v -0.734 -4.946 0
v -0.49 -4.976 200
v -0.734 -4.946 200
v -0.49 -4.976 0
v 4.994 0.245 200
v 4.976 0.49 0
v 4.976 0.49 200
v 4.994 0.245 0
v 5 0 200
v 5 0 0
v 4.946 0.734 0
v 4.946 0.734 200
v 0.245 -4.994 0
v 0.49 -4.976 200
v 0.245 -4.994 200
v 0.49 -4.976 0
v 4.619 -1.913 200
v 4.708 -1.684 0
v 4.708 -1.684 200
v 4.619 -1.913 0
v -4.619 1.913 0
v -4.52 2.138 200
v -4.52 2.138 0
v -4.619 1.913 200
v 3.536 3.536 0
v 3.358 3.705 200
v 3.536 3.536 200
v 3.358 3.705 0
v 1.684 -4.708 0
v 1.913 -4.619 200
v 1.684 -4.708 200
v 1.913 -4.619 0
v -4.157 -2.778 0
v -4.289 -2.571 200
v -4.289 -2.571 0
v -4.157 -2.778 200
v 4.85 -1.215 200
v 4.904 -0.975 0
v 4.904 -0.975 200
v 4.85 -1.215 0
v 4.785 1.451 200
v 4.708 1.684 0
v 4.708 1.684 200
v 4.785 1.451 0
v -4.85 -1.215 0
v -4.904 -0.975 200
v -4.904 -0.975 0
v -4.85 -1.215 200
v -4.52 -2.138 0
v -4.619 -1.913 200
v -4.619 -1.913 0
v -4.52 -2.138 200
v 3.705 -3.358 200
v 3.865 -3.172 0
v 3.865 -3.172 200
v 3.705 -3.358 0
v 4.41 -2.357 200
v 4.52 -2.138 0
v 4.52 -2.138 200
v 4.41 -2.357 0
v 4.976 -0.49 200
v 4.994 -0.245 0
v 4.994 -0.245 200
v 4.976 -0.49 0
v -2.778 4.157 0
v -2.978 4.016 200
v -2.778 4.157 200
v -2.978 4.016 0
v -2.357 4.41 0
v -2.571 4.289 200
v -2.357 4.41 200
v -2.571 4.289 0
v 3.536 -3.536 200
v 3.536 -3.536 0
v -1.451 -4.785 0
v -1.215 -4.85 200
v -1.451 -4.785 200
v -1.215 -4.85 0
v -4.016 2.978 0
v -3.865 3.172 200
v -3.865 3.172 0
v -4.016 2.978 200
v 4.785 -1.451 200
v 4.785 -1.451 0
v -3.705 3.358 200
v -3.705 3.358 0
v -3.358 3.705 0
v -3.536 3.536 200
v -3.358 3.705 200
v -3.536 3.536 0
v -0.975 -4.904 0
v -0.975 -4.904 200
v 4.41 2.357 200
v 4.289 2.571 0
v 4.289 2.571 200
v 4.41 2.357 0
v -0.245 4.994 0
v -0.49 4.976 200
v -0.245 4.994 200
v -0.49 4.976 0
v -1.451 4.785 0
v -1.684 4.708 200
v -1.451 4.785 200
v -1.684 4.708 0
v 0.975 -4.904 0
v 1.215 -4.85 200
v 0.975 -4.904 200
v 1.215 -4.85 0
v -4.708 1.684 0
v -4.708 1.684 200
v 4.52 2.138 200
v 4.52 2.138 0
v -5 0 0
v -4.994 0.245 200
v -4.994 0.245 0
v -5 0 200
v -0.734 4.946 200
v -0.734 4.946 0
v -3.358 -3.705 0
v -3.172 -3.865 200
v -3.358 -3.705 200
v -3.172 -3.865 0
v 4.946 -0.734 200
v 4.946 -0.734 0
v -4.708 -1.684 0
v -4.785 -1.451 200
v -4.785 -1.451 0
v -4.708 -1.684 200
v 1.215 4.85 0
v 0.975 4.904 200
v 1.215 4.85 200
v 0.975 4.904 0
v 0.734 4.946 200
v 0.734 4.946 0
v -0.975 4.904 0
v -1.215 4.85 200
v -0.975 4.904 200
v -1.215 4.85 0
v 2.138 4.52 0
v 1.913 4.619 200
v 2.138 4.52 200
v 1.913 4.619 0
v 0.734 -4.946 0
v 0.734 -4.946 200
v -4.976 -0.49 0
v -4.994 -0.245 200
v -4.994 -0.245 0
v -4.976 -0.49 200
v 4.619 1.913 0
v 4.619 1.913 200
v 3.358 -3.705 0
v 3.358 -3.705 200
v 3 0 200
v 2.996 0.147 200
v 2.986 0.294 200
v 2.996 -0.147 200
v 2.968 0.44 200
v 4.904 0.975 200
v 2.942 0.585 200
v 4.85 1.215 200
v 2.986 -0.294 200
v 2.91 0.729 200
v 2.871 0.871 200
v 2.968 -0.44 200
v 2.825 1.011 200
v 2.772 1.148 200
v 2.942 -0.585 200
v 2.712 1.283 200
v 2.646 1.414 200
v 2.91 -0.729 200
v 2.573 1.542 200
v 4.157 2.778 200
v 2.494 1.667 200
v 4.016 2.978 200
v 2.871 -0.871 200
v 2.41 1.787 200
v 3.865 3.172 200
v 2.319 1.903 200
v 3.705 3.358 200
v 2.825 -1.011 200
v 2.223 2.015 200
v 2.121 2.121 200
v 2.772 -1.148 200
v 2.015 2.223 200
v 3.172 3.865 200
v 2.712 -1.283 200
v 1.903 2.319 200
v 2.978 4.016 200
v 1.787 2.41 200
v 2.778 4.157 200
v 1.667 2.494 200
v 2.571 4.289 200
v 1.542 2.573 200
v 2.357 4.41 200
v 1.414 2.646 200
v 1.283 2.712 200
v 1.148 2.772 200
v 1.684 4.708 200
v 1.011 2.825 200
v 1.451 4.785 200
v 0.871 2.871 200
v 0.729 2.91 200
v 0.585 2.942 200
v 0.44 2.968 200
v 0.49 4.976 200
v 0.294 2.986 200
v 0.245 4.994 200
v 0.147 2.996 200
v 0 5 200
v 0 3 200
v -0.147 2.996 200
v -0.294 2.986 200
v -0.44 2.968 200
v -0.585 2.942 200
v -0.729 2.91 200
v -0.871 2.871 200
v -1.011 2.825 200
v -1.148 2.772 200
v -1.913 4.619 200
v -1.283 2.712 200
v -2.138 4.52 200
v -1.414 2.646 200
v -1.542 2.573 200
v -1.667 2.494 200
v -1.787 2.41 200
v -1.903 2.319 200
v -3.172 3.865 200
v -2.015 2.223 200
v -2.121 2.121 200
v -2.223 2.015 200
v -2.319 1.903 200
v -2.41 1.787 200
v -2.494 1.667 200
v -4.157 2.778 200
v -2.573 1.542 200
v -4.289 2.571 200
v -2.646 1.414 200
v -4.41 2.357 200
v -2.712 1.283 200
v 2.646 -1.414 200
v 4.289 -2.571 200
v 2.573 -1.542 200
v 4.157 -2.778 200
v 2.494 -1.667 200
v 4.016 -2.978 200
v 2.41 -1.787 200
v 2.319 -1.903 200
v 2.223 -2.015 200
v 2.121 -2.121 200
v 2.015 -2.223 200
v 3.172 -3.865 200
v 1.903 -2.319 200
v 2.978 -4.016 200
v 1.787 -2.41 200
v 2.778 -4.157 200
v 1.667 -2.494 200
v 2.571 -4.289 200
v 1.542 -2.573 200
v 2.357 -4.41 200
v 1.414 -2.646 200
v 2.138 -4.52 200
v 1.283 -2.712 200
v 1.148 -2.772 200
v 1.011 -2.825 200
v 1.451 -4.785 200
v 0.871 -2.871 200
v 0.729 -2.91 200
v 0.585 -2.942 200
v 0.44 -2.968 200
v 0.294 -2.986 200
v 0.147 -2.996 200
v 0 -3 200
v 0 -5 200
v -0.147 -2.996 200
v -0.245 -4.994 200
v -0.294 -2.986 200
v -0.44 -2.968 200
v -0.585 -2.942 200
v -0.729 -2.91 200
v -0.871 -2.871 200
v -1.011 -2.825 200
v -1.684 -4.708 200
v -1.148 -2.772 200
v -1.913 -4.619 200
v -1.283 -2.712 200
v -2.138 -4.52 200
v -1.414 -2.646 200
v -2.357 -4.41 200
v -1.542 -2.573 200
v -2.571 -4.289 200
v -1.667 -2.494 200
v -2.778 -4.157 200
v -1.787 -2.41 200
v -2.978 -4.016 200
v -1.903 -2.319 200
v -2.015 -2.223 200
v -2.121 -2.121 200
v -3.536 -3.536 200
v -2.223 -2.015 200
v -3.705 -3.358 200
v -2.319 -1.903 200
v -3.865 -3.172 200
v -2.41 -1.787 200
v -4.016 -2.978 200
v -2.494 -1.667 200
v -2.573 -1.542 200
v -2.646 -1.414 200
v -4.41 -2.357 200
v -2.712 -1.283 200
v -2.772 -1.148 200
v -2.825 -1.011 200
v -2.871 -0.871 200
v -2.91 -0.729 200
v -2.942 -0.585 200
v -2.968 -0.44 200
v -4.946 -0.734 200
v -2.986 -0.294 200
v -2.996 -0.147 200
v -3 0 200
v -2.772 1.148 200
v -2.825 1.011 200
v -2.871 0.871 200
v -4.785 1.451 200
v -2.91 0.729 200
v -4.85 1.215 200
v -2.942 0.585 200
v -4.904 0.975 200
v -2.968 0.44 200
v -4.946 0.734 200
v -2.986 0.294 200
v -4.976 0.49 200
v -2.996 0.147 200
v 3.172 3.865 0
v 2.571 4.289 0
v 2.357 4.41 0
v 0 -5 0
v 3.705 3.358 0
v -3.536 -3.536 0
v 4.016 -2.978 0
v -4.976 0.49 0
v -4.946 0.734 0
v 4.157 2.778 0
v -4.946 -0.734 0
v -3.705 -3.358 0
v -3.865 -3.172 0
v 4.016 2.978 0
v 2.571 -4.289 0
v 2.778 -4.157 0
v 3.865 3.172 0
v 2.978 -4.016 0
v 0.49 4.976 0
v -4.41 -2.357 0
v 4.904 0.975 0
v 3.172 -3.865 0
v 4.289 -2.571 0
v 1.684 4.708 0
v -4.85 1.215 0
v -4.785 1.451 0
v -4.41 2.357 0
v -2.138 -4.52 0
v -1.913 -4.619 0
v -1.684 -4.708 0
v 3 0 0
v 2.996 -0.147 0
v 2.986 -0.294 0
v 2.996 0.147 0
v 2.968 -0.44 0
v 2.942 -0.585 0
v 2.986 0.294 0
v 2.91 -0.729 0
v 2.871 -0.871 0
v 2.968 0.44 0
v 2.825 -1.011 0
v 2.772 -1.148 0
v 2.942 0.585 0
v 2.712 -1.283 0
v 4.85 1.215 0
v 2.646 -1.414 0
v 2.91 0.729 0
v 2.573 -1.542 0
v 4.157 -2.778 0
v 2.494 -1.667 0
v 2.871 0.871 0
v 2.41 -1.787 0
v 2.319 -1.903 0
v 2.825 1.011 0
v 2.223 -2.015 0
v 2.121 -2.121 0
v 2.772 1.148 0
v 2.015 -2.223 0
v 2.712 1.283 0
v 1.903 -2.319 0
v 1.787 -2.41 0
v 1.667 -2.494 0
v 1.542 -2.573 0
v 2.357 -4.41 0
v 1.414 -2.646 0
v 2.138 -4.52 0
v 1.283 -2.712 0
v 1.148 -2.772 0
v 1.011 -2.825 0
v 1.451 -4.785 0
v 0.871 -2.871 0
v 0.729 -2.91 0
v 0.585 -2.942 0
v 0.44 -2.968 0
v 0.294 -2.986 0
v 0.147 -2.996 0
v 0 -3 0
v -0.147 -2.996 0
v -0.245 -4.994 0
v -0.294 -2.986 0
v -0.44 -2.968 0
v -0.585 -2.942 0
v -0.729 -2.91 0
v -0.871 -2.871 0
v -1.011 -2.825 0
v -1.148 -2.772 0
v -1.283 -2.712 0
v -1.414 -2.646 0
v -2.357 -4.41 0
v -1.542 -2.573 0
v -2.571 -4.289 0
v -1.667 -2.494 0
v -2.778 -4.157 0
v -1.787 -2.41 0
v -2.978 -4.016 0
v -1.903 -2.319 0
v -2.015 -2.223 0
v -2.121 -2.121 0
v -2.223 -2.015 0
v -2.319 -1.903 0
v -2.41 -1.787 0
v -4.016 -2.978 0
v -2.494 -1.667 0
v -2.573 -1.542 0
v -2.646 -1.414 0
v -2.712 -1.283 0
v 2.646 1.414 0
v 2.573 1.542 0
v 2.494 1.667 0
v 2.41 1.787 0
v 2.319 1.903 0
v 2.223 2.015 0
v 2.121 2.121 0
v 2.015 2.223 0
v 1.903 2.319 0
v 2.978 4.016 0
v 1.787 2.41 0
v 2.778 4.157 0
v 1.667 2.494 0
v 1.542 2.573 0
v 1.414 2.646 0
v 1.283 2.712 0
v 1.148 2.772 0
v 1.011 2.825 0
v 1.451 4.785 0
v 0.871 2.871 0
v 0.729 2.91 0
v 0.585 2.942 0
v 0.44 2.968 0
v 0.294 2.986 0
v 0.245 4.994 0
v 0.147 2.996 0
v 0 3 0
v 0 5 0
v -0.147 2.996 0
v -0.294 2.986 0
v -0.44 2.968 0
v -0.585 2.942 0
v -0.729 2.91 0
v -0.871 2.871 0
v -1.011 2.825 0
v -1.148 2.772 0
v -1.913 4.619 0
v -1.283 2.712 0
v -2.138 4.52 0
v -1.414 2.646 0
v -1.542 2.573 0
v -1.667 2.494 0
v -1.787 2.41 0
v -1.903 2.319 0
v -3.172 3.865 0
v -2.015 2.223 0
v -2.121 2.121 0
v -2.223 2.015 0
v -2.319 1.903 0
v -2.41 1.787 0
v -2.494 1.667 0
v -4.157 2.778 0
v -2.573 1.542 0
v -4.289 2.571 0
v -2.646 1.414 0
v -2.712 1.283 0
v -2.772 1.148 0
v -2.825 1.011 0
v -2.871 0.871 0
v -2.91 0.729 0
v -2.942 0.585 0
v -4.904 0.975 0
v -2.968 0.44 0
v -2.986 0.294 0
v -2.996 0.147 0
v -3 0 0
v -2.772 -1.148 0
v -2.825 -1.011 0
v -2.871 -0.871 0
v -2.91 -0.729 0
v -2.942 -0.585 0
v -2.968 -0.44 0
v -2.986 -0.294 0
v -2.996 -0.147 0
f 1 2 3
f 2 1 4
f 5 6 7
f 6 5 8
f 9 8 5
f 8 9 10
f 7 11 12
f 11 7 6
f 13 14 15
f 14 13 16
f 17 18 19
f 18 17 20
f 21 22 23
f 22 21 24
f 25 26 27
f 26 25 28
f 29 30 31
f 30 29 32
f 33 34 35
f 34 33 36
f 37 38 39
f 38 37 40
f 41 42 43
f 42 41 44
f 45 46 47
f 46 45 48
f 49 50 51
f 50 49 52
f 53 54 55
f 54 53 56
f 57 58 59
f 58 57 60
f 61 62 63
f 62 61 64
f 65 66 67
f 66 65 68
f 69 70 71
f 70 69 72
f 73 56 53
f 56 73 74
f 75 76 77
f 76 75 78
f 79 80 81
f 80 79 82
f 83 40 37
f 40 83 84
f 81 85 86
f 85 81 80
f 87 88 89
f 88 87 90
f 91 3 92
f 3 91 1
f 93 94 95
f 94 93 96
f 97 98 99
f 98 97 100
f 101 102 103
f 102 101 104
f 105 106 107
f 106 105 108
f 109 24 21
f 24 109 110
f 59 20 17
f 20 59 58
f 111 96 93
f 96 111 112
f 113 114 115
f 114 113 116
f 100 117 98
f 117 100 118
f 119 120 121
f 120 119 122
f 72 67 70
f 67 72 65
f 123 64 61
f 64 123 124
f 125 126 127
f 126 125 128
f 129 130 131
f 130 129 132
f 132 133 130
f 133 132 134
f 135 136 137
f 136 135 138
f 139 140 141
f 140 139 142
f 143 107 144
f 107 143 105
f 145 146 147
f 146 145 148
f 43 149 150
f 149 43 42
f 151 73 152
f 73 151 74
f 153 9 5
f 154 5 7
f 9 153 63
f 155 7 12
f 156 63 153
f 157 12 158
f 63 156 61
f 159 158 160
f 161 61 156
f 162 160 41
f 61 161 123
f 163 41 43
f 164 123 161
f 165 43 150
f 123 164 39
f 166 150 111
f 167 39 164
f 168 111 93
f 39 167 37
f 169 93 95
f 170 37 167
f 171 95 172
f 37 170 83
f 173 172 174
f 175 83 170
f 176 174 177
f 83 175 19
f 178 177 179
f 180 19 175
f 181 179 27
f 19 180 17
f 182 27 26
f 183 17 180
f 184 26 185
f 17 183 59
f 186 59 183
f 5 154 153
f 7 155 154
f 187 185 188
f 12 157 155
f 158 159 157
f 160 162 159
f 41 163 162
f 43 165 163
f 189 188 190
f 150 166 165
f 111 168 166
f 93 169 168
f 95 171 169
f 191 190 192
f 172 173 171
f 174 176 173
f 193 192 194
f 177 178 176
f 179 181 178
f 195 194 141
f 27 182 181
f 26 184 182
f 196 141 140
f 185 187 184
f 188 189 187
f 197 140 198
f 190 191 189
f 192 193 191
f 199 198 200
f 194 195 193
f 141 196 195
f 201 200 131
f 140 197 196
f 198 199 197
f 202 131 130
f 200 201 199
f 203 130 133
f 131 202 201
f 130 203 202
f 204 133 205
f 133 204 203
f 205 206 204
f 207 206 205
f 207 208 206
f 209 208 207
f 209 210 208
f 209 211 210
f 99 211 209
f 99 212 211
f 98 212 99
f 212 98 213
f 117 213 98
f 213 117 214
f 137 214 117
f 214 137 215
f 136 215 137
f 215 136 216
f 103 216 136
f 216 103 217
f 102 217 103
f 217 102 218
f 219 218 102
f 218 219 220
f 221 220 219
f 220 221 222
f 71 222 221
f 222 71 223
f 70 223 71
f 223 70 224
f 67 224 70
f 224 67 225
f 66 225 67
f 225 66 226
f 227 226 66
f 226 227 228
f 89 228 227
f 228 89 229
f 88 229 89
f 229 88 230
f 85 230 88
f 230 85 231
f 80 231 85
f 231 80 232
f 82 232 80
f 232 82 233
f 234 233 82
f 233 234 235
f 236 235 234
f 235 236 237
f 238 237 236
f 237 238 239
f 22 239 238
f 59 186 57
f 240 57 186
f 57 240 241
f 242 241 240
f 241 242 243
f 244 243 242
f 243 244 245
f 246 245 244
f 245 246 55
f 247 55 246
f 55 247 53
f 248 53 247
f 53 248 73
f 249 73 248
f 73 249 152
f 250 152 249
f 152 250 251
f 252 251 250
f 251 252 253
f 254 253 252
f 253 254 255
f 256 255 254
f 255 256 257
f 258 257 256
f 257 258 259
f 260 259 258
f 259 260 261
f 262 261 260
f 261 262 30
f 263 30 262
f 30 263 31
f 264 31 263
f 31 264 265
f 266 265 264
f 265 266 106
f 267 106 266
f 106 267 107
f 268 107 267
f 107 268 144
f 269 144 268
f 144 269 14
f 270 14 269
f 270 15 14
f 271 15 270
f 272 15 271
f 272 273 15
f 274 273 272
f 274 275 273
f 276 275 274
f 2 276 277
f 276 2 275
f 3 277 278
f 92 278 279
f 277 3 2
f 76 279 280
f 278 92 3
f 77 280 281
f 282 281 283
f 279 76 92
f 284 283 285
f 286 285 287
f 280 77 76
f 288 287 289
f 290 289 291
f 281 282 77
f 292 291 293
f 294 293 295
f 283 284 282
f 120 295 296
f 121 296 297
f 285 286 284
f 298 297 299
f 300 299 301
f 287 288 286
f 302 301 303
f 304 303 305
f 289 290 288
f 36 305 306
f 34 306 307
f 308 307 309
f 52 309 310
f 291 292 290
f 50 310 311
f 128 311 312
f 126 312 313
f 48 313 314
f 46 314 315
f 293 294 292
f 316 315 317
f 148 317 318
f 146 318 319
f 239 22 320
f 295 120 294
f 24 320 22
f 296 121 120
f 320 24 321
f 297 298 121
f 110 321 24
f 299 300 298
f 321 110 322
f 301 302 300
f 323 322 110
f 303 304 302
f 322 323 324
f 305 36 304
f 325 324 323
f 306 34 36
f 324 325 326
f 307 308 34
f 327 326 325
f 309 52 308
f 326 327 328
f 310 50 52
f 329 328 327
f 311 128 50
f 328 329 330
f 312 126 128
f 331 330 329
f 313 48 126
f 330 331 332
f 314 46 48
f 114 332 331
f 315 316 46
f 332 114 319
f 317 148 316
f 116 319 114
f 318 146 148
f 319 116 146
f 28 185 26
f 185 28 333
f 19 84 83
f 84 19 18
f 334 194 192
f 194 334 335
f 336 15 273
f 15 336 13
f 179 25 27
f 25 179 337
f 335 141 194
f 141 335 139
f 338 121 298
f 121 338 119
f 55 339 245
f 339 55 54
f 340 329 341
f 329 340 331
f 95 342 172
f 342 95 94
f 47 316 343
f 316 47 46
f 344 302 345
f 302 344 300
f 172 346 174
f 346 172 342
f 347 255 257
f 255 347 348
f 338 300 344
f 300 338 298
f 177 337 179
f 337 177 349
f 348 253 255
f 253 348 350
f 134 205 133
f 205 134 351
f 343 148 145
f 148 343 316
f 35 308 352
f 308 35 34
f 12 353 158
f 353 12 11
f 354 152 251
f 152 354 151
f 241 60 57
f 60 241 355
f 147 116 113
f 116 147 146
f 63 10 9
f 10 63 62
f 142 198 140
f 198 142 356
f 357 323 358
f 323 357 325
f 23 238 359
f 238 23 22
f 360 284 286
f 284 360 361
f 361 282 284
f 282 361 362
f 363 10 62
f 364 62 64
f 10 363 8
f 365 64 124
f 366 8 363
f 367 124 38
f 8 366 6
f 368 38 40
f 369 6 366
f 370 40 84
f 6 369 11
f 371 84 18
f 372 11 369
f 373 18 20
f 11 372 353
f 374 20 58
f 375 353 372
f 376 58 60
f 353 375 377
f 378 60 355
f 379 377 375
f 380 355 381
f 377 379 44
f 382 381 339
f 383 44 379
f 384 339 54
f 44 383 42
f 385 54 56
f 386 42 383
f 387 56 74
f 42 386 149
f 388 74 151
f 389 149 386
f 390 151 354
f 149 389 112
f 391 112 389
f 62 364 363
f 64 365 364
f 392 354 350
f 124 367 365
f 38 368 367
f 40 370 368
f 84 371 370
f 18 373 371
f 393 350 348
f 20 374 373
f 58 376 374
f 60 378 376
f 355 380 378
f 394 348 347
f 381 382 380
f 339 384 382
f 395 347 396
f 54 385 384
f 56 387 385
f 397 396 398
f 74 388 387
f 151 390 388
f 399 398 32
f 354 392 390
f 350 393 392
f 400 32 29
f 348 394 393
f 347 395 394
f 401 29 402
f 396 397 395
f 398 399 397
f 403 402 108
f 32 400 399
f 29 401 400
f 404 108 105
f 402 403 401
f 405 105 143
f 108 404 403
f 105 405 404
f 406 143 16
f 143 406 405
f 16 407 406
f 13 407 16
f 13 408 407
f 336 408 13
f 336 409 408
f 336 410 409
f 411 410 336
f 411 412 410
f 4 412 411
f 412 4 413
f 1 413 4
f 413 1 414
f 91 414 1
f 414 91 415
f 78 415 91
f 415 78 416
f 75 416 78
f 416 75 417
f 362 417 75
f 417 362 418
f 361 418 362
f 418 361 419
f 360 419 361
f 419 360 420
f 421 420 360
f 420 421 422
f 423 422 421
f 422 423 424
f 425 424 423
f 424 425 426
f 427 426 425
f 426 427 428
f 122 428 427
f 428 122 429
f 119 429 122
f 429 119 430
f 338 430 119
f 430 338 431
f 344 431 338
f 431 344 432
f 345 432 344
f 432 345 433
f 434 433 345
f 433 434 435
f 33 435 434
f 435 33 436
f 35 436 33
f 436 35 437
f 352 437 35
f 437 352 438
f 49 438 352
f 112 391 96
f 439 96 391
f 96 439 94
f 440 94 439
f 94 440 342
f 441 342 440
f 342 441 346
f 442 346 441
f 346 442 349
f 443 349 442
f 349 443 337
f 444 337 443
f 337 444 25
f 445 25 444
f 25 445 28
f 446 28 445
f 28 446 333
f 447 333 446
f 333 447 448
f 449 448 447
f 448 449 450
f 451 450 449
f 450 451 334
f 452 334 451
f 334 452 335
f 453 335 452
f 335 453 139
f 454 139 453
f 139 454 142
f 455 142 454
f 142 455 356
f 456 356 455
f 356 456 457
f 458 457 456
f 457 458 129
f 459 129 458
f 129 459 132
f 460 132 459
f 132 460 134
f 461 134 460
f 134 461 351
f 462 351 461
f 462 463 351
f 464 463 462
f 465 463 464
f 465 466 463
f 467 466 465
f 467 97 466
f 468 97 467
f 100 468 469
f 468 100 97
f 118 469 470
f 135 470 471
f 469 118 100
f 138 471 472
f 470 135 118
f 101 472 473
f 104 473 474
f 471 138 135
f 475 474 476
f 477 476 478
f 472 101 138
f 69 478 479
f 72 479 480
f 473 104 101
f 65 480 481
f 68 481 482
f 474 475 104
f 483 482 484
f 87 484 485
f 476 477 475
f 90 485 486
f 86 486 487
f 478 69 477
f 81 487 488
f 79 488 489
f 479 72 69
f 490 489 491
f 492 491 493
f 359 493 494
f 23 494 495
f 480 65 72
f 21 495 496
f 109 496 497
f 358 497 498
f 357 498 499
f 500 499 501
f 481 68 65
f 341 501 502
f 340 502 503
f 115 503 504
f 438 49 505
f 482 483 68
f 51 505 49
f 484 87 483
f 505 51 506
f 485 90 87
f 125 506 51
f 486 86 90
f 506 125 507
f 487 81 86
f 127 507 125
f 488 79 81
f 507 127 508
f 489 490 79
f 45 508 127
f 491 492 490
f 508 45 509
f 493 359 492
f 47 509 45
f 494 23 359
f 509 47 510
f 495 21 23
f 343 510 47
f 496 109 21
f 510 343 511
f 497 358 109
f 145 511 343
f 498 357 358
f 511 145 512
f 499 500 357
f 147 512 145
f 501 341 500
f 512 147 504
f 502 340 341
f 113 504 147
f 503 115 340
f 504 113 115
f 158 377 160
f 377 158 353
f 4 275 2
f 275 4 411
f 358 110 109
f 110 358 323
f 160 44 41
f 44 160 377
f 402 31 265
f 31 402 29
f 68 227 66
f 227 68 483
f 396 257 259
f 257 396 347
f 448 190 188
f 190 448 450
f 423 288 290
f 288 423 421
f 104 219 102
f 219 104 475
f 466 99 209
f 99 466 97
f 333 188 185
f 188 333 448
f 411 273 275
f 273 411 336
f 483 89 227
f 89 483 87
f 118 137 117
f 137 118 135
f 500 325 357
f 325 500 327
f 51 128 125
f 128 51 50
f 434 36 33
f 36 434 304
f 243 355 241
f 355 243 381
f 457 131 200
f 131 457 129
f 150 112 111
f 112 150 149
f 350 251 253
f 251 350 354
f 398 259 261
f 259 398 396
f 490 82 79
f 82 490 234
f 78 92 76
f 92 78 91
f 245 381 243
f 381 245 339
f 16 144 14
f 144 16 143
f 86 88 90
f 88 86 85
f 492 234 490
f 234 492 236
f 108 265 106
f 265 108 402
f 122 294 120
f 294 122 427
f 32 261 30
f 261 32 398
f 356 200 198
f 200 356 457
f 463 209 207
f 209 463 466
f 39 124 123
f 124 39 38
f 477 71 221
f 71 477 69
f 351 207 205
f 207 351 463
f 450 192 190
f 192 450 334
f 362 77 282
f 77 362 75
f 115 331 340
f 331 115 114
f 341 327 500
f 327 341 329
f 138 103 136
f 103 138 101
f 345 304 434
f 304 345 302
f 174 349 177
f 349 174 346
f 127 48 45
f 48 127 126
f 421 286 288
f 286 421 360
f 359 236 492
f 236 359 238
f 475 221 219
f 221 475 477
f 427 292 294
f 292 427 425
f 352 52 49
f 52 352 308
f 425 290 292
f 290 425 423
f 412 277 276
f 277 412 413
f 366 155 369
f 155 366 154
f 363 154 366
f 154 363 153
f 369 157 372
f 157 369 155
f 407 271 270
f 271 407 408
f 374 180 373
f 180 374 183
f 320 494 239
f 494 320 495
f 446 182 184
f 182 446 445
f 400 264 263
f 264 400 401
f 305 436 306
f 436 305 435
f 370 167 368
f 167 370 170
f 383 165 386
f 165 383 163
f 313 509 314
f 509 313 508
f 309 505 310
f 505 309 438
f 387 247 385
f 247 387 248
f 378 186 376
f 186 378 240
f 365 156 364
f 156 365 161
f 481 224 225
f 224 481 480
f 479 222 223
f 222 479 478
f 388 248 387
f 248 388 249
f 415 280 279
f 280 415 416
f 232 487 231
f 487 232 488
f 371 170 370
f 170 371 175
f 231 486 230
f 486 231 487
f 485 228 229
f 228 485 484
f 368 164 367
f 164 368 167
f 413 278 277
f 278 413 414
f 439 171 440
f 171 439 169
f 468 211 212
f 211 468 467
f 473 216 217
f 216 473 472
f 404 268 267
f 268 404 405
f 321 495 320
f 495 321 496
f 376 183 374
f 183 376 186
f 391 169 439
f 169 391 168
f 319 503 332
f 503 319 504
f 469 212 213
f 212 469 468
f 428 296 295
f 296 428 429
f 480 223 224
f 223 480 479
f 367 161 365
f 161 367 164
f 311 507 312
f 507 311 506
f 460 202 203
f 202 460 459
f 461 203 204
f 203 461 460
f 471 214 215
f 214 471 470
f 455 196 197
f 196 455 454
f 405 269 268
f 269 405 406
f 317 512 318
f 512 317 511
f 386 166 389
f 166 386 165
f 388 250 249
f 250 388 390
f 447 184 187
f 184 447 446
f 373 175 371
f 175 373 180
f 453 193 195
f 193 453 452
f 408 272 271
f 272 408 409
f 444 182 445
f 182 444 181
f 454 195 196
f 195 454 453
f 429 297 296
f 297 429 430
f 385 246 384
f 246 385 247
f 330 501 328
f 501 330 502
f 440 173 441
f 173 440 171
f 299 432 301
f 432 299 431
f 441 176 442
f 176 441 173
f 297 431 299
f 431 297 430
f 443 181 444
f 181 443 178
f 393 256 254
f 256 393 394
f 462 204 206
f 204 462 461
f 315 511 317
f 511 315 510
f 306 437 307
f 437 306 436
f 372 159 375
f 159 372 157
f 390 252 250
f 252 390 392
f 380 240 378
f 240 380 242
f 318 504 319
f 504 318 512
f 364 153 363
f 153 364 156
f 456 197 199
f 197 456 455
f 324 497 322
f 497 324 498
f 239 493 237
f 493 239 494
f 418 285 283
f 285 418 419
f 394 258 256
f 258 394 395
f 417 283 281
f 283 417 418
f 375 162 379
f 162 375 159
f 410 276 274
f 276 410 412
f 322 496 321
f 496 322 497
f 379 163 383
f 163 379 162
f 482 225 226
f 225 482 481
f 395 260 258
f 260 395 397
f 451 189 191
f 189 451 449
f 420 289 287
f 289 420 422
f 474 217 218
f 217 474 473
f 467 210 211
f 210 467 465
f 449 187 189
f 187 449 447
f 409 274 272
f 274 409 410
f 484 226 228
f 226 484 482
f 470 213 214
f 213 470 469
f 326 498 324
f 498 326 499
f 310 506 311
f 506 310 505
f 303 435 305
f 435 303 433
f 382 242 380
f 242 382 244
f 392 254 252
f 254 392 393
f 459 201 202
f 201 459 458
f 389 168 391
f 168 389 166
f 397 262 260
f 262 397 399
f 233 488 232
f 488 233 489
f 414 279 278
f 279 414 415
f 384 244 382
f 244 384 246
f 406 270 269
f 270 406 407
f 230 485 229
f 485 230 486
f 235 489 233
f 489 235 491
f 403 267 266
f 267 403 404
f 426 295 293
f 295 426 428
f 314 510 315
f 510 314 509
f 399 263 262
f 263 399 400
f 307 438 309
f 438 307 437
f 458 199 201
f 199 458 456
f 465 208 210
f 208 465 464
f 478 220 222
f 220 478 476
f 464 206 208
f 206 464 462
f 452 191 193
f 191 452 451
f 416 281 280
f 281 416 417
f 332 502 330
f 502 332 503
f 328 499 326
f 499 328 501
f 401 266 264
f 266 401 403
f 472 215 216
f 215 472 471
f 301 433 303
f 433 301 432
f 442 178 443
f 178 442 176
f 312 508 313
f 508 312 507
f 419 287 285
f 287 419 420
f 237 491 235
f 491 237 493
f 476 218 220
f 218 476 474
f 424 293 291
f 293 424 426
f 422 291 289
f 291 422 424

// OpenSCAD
$fn = 128;

// PVC aquarium tubing (hollow flexible tube)
inner_d = 6;      // mm
outer_d = 10;     // mm
length  = 200;    // mm

module tubing(od, id, h) {
    difference() {
        cylinder(d=od, h=h, center=false);
        translate([0,0,-0.5])
            cylinder(d=id, h=h+1, center=false);
    }
}

color([0.85, 0.9, 0.95, 0.35]) tubing(outer_d, inner_d, length);
